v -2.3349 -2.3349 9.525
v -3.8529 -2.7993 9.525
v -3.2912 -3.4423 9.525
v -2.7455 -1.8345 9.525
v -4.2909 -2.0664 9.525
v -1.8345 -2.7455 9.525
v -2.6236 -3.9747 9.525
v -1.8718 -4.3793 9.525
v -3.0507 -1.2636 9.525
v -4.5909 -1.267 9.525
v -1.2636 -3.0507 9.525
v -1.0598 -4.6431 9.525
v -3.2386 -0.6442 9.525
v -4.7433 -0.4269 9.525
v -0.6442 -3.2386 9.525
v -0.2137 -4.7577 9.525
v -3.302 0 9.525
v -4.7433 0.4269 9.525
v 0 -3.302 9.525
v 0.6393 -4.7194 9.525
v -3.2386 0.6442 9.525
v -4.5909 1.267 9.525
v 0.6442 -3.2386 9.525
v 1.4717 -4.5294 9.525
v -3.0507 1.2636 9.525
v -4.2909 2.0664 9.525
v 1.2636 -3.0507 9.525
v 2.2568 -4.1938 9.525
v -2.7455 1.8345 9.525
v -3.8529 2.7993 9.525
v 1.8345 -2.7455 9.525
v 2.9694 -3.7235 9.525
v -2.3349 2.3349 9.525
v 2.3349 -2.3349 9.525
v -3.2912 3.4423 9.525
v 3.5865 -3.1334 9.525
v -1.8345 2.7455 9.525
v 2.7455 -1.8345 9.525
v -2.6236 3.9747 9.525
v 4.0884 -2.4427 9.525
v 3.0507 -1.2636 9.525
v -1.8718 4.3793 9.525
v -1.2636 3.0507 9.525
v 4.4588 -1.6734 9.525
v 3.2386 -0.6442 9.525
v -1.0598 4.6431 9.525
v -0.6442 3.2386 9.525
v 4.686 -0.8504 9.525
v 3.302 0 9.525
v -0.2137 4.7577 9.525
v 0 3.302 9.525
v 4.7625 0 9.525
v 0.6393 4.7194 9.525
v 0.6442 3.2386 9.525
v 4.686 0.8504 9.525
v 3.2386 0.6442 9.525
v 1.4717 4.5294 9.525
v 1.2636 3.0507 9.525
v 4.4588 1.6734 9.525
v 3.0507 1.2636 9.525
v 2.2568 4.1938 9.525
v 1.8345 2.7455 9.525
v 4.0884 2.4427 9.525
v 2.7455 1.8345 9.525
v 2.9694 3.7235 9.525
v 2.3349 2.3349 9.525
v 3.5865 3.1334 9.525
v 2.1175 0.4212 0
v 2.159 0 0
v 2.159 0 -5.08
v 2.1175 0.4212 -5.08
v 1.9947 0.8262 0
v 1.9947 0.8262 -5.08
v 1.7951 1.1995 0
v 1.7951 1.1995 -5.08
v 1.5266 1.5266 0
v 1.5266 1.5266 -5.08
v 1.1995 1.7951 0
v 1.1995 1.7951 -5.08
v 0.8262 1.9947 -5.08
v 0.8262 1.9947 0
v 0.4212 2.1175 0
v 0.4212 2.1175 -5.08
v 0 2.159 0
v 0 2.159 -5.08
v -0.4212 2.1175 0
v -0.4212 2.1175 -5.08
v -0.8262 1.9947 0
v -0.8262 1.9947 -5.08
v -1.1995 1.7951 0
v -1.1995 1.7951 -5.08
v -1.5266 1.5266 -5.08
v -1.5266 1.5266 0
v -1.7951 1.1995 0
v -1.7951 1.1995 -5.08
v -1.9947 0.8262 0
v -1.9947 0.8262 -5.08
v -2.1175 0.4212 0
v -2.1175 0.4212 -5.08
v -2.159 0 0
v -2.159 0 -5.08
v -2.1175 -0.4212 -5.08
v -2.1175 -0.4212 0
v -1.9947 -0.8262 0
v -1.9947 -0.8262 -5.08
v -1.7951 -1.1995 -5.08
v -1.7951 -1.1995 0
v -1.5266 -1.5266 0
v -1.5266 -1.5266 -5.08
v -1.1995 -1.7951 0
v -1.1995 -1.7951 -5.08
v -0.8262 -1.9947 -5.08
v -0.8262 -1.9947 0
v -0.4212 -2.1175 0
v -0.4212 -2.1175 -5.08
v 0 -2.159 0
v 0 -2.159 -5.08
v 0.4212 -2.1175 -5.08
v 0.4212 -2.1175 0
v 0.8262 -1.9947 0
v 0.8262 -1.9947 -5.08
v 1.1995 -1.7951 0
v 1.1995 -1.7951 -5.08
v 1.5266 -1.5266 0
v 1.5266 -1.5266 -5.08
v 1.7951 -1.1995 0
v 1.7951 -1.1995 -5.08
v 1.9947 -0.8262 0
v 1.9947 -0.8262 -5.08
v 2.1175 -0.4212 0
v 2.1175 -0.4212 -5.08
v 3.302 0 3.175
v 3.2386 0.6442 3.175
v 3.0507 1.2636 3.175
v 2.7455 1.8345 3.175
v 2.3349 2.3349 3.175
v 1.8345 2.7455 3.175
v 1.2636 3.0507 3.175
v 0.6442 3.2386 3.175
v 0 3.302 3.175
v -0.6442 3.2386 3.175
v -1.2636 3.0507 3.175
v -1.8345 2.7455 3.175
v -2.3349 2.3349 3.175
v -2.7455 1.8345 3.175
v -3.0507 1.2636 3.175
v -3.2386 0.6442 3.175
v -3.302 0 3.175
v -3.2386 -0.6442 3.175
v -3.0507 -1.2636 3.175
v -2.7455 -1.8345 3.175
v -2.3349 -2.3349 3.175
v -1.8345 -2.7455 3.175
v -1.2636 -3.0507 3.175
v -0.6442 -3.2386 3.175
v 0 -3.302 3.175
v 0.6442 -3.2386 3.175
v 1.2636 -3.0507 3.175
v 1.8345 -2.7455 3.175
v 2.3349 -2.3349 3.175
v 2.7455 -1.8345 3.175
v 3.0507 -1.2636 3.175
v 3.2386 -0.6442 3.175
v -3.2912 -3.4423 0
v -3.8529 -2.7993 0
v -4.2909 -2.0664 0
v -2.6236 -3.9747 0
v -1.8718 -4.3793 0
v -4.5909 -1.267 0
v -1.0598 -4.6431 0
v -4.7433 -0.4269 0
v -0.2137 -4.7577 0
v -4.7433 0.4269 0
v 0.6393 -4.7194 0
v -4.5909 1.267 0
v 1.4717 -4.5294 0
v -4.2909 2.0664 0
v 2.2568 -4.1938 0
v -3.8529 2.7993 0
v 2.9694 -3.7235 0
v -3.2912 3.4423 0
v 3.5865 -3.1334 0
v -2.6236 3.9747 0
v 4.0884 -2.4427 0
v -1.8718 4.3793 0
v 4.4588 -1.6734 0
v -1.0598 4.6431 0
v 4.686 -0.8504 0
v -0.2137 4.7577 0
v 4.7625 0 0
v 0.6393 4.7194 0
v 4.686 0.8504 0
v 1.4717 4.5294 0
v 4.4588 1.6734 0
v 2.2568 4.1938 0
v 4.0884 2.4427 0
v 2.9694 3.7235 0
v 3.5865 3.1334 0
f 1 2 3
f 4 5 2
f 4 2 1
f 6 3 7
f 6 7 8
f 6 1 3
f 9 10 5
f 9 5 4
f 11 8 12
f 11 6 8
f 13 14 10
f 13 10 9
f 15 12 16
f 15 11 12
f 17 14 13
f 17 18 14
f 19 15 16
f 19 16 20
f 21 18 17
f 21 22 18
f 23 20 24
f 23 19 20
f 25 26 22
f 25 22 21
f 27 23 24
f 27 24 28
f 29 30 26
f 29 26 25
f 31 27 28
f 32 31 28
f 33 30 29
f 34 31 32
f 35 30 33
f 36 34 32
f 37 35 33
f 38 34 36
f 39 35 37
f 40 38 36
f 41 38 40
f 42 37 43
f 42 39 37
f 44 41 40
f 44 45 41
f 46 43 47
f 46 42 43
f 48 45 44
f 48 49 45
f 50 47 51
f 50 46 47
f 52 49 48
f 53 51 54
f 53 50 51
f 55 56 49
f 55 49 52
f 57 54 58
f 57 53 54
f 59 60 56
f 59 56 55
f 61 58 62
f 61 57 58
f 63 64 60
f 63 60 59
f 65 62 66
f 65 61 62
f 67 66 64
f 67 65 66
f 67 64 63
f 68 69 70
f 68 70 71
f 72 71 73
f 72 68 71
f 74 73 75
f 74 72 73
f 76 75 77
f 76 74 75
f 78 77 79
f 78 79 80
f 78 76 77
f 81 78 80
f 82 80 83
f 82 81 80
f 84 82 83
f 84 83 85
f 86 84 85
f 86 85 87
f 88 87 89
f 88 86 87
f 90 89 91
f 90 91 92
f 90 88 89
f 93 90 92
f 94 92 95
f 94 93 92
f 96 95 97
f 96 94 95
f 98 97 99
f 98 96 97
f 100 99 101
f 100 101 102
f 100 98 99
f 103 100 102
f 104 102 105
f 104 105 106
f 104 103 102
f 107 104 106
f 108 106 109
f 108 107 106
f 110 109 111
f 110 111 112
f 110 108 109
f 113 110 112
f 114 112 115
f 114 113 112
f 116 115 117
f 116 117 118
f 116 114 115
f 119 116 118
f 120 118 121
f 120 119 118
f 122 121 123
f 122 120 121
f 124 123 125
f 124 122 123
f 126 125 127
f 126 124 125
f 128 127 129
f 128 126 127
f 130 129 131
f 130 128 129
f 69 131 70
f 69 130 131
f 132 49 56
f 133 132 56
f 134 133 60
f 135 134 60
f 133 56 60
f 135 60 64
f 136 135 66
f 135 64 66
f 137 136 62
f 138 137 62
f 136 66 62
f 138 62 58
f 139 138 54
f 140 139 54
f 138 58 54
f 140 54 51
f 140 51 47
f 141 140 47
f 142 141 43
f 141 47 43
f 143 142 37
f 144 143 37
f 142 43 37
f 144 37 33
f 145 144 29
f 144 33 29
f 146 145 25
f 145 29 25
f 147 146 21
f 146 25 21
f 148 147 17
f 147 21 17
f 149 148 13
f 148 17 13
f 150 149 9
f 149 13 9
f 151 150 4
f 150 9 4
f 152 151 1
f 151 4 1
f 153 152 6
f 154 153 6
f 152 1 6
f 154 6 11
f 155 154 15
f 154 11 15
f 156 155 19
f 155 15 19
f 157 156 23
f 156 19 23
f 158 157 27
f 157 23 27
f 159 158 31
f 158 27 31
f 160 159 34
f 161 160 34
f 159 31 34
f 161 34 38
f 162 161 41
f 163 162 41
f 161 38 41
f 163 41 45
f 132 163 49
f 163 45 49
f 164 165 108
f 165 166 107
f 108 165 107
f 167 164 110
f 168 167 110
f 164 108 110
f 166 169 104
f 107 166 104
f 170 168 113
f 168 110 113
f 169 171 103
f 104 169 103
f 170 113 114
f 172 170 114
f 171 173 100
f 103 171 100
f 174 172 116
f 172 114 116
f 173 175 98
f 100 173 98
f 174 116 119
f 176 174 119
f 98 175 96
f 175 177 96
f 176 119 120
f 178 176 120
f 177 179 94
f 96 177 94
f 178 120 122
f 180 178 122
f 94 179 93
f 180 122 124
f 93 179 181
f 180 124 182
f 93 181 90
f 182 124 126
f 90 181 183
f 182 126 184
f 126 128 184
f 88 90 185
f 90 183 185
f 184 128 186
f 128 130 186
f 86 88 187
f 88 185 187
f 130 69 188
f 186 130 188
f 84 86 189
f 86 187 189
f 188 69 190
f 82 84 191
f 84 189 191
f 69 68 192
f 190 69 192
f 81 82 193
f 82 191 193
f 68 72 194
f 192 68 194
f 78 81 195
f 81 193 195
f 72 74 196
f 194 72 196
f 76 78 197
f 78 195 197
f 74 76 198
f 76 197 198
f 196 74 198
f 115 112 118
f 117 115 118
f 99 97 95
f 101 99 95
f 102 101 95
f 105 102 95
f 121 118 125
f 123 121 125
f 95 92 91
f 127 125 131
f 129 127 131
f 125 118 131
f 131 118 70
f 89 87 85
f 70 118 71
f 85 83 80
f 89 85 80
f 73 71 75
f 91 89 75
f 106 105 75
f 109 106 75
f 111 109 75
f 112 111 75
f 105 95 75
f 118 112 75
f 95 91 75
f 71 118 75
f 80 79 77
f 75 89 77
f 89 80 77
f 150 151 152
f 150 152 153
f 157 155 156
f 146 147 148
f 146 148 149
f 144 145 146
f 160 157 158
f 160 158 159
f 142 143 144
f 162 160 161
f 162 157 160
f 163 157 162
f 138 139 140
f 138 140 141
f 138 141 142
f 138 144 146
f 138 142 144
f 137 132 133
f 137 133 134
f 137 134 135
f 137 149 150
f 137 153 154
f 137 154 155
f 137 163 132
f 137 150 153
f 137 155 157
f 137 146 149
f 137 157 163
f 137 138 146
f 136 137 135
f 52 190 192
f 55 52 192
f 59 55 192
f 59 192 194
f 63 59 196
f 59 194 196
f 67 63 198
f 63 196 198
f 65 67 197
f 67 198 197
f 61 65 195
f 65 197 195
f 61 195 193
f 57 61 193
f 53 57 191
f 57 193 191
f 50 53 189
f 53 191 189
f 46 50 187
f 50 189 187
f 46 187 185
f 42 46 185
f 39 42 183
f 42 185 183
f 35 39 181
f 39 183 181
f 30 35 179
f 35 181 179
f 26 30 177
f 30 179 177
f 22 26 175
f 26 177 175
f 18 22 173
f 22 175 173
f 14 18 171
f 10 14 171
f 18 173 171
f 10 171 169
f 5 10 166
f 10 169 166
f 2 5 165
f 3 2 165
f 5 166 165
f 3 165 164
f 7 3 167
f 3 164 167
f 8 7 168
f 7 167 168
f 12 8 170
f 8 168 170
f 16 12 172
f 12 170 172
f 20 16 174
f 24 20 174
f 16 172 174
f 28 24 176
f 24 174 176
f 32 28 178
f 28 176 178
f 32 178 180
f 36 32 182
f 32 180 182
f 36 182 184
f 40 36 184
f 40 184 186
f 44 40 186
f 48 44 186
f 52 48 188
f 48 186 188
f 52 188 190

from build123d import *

# Parameters (mm, degrees)
F0_R     = 4.7625
F0_R_2   = 2.159
F1_DEPTH = 9.525
F2_DEPTH = 5.08
F3_R     = 3.302
F4_DEPTH = 6.35


with BuildPart() as f1:
    # F0 (on Top) → F1 (new body)
    with BuildSketch(Plane.XY):
        Circle(F0_R)
        Circle(F0_R_2, mode=Mode.SUBTRACT)
        Circle(F0_R_2)
    extrude(amount=F1_DEPTH)

    # F0 (on Top) → F2 (join)
    with BuildSketch(Plane.XY):
        Circle(F0_R_2)
    extrude(amount=-F2_DEPTH)

    # F3 (on face) → F4 (cut)
    with BuildSketch(Plane.XY.offset(9.525)):
        Circle(F3_R)
    extrude(amount=-F4_DEPTH, mode=Mode.SUBTRACT)


solid = f1.part
